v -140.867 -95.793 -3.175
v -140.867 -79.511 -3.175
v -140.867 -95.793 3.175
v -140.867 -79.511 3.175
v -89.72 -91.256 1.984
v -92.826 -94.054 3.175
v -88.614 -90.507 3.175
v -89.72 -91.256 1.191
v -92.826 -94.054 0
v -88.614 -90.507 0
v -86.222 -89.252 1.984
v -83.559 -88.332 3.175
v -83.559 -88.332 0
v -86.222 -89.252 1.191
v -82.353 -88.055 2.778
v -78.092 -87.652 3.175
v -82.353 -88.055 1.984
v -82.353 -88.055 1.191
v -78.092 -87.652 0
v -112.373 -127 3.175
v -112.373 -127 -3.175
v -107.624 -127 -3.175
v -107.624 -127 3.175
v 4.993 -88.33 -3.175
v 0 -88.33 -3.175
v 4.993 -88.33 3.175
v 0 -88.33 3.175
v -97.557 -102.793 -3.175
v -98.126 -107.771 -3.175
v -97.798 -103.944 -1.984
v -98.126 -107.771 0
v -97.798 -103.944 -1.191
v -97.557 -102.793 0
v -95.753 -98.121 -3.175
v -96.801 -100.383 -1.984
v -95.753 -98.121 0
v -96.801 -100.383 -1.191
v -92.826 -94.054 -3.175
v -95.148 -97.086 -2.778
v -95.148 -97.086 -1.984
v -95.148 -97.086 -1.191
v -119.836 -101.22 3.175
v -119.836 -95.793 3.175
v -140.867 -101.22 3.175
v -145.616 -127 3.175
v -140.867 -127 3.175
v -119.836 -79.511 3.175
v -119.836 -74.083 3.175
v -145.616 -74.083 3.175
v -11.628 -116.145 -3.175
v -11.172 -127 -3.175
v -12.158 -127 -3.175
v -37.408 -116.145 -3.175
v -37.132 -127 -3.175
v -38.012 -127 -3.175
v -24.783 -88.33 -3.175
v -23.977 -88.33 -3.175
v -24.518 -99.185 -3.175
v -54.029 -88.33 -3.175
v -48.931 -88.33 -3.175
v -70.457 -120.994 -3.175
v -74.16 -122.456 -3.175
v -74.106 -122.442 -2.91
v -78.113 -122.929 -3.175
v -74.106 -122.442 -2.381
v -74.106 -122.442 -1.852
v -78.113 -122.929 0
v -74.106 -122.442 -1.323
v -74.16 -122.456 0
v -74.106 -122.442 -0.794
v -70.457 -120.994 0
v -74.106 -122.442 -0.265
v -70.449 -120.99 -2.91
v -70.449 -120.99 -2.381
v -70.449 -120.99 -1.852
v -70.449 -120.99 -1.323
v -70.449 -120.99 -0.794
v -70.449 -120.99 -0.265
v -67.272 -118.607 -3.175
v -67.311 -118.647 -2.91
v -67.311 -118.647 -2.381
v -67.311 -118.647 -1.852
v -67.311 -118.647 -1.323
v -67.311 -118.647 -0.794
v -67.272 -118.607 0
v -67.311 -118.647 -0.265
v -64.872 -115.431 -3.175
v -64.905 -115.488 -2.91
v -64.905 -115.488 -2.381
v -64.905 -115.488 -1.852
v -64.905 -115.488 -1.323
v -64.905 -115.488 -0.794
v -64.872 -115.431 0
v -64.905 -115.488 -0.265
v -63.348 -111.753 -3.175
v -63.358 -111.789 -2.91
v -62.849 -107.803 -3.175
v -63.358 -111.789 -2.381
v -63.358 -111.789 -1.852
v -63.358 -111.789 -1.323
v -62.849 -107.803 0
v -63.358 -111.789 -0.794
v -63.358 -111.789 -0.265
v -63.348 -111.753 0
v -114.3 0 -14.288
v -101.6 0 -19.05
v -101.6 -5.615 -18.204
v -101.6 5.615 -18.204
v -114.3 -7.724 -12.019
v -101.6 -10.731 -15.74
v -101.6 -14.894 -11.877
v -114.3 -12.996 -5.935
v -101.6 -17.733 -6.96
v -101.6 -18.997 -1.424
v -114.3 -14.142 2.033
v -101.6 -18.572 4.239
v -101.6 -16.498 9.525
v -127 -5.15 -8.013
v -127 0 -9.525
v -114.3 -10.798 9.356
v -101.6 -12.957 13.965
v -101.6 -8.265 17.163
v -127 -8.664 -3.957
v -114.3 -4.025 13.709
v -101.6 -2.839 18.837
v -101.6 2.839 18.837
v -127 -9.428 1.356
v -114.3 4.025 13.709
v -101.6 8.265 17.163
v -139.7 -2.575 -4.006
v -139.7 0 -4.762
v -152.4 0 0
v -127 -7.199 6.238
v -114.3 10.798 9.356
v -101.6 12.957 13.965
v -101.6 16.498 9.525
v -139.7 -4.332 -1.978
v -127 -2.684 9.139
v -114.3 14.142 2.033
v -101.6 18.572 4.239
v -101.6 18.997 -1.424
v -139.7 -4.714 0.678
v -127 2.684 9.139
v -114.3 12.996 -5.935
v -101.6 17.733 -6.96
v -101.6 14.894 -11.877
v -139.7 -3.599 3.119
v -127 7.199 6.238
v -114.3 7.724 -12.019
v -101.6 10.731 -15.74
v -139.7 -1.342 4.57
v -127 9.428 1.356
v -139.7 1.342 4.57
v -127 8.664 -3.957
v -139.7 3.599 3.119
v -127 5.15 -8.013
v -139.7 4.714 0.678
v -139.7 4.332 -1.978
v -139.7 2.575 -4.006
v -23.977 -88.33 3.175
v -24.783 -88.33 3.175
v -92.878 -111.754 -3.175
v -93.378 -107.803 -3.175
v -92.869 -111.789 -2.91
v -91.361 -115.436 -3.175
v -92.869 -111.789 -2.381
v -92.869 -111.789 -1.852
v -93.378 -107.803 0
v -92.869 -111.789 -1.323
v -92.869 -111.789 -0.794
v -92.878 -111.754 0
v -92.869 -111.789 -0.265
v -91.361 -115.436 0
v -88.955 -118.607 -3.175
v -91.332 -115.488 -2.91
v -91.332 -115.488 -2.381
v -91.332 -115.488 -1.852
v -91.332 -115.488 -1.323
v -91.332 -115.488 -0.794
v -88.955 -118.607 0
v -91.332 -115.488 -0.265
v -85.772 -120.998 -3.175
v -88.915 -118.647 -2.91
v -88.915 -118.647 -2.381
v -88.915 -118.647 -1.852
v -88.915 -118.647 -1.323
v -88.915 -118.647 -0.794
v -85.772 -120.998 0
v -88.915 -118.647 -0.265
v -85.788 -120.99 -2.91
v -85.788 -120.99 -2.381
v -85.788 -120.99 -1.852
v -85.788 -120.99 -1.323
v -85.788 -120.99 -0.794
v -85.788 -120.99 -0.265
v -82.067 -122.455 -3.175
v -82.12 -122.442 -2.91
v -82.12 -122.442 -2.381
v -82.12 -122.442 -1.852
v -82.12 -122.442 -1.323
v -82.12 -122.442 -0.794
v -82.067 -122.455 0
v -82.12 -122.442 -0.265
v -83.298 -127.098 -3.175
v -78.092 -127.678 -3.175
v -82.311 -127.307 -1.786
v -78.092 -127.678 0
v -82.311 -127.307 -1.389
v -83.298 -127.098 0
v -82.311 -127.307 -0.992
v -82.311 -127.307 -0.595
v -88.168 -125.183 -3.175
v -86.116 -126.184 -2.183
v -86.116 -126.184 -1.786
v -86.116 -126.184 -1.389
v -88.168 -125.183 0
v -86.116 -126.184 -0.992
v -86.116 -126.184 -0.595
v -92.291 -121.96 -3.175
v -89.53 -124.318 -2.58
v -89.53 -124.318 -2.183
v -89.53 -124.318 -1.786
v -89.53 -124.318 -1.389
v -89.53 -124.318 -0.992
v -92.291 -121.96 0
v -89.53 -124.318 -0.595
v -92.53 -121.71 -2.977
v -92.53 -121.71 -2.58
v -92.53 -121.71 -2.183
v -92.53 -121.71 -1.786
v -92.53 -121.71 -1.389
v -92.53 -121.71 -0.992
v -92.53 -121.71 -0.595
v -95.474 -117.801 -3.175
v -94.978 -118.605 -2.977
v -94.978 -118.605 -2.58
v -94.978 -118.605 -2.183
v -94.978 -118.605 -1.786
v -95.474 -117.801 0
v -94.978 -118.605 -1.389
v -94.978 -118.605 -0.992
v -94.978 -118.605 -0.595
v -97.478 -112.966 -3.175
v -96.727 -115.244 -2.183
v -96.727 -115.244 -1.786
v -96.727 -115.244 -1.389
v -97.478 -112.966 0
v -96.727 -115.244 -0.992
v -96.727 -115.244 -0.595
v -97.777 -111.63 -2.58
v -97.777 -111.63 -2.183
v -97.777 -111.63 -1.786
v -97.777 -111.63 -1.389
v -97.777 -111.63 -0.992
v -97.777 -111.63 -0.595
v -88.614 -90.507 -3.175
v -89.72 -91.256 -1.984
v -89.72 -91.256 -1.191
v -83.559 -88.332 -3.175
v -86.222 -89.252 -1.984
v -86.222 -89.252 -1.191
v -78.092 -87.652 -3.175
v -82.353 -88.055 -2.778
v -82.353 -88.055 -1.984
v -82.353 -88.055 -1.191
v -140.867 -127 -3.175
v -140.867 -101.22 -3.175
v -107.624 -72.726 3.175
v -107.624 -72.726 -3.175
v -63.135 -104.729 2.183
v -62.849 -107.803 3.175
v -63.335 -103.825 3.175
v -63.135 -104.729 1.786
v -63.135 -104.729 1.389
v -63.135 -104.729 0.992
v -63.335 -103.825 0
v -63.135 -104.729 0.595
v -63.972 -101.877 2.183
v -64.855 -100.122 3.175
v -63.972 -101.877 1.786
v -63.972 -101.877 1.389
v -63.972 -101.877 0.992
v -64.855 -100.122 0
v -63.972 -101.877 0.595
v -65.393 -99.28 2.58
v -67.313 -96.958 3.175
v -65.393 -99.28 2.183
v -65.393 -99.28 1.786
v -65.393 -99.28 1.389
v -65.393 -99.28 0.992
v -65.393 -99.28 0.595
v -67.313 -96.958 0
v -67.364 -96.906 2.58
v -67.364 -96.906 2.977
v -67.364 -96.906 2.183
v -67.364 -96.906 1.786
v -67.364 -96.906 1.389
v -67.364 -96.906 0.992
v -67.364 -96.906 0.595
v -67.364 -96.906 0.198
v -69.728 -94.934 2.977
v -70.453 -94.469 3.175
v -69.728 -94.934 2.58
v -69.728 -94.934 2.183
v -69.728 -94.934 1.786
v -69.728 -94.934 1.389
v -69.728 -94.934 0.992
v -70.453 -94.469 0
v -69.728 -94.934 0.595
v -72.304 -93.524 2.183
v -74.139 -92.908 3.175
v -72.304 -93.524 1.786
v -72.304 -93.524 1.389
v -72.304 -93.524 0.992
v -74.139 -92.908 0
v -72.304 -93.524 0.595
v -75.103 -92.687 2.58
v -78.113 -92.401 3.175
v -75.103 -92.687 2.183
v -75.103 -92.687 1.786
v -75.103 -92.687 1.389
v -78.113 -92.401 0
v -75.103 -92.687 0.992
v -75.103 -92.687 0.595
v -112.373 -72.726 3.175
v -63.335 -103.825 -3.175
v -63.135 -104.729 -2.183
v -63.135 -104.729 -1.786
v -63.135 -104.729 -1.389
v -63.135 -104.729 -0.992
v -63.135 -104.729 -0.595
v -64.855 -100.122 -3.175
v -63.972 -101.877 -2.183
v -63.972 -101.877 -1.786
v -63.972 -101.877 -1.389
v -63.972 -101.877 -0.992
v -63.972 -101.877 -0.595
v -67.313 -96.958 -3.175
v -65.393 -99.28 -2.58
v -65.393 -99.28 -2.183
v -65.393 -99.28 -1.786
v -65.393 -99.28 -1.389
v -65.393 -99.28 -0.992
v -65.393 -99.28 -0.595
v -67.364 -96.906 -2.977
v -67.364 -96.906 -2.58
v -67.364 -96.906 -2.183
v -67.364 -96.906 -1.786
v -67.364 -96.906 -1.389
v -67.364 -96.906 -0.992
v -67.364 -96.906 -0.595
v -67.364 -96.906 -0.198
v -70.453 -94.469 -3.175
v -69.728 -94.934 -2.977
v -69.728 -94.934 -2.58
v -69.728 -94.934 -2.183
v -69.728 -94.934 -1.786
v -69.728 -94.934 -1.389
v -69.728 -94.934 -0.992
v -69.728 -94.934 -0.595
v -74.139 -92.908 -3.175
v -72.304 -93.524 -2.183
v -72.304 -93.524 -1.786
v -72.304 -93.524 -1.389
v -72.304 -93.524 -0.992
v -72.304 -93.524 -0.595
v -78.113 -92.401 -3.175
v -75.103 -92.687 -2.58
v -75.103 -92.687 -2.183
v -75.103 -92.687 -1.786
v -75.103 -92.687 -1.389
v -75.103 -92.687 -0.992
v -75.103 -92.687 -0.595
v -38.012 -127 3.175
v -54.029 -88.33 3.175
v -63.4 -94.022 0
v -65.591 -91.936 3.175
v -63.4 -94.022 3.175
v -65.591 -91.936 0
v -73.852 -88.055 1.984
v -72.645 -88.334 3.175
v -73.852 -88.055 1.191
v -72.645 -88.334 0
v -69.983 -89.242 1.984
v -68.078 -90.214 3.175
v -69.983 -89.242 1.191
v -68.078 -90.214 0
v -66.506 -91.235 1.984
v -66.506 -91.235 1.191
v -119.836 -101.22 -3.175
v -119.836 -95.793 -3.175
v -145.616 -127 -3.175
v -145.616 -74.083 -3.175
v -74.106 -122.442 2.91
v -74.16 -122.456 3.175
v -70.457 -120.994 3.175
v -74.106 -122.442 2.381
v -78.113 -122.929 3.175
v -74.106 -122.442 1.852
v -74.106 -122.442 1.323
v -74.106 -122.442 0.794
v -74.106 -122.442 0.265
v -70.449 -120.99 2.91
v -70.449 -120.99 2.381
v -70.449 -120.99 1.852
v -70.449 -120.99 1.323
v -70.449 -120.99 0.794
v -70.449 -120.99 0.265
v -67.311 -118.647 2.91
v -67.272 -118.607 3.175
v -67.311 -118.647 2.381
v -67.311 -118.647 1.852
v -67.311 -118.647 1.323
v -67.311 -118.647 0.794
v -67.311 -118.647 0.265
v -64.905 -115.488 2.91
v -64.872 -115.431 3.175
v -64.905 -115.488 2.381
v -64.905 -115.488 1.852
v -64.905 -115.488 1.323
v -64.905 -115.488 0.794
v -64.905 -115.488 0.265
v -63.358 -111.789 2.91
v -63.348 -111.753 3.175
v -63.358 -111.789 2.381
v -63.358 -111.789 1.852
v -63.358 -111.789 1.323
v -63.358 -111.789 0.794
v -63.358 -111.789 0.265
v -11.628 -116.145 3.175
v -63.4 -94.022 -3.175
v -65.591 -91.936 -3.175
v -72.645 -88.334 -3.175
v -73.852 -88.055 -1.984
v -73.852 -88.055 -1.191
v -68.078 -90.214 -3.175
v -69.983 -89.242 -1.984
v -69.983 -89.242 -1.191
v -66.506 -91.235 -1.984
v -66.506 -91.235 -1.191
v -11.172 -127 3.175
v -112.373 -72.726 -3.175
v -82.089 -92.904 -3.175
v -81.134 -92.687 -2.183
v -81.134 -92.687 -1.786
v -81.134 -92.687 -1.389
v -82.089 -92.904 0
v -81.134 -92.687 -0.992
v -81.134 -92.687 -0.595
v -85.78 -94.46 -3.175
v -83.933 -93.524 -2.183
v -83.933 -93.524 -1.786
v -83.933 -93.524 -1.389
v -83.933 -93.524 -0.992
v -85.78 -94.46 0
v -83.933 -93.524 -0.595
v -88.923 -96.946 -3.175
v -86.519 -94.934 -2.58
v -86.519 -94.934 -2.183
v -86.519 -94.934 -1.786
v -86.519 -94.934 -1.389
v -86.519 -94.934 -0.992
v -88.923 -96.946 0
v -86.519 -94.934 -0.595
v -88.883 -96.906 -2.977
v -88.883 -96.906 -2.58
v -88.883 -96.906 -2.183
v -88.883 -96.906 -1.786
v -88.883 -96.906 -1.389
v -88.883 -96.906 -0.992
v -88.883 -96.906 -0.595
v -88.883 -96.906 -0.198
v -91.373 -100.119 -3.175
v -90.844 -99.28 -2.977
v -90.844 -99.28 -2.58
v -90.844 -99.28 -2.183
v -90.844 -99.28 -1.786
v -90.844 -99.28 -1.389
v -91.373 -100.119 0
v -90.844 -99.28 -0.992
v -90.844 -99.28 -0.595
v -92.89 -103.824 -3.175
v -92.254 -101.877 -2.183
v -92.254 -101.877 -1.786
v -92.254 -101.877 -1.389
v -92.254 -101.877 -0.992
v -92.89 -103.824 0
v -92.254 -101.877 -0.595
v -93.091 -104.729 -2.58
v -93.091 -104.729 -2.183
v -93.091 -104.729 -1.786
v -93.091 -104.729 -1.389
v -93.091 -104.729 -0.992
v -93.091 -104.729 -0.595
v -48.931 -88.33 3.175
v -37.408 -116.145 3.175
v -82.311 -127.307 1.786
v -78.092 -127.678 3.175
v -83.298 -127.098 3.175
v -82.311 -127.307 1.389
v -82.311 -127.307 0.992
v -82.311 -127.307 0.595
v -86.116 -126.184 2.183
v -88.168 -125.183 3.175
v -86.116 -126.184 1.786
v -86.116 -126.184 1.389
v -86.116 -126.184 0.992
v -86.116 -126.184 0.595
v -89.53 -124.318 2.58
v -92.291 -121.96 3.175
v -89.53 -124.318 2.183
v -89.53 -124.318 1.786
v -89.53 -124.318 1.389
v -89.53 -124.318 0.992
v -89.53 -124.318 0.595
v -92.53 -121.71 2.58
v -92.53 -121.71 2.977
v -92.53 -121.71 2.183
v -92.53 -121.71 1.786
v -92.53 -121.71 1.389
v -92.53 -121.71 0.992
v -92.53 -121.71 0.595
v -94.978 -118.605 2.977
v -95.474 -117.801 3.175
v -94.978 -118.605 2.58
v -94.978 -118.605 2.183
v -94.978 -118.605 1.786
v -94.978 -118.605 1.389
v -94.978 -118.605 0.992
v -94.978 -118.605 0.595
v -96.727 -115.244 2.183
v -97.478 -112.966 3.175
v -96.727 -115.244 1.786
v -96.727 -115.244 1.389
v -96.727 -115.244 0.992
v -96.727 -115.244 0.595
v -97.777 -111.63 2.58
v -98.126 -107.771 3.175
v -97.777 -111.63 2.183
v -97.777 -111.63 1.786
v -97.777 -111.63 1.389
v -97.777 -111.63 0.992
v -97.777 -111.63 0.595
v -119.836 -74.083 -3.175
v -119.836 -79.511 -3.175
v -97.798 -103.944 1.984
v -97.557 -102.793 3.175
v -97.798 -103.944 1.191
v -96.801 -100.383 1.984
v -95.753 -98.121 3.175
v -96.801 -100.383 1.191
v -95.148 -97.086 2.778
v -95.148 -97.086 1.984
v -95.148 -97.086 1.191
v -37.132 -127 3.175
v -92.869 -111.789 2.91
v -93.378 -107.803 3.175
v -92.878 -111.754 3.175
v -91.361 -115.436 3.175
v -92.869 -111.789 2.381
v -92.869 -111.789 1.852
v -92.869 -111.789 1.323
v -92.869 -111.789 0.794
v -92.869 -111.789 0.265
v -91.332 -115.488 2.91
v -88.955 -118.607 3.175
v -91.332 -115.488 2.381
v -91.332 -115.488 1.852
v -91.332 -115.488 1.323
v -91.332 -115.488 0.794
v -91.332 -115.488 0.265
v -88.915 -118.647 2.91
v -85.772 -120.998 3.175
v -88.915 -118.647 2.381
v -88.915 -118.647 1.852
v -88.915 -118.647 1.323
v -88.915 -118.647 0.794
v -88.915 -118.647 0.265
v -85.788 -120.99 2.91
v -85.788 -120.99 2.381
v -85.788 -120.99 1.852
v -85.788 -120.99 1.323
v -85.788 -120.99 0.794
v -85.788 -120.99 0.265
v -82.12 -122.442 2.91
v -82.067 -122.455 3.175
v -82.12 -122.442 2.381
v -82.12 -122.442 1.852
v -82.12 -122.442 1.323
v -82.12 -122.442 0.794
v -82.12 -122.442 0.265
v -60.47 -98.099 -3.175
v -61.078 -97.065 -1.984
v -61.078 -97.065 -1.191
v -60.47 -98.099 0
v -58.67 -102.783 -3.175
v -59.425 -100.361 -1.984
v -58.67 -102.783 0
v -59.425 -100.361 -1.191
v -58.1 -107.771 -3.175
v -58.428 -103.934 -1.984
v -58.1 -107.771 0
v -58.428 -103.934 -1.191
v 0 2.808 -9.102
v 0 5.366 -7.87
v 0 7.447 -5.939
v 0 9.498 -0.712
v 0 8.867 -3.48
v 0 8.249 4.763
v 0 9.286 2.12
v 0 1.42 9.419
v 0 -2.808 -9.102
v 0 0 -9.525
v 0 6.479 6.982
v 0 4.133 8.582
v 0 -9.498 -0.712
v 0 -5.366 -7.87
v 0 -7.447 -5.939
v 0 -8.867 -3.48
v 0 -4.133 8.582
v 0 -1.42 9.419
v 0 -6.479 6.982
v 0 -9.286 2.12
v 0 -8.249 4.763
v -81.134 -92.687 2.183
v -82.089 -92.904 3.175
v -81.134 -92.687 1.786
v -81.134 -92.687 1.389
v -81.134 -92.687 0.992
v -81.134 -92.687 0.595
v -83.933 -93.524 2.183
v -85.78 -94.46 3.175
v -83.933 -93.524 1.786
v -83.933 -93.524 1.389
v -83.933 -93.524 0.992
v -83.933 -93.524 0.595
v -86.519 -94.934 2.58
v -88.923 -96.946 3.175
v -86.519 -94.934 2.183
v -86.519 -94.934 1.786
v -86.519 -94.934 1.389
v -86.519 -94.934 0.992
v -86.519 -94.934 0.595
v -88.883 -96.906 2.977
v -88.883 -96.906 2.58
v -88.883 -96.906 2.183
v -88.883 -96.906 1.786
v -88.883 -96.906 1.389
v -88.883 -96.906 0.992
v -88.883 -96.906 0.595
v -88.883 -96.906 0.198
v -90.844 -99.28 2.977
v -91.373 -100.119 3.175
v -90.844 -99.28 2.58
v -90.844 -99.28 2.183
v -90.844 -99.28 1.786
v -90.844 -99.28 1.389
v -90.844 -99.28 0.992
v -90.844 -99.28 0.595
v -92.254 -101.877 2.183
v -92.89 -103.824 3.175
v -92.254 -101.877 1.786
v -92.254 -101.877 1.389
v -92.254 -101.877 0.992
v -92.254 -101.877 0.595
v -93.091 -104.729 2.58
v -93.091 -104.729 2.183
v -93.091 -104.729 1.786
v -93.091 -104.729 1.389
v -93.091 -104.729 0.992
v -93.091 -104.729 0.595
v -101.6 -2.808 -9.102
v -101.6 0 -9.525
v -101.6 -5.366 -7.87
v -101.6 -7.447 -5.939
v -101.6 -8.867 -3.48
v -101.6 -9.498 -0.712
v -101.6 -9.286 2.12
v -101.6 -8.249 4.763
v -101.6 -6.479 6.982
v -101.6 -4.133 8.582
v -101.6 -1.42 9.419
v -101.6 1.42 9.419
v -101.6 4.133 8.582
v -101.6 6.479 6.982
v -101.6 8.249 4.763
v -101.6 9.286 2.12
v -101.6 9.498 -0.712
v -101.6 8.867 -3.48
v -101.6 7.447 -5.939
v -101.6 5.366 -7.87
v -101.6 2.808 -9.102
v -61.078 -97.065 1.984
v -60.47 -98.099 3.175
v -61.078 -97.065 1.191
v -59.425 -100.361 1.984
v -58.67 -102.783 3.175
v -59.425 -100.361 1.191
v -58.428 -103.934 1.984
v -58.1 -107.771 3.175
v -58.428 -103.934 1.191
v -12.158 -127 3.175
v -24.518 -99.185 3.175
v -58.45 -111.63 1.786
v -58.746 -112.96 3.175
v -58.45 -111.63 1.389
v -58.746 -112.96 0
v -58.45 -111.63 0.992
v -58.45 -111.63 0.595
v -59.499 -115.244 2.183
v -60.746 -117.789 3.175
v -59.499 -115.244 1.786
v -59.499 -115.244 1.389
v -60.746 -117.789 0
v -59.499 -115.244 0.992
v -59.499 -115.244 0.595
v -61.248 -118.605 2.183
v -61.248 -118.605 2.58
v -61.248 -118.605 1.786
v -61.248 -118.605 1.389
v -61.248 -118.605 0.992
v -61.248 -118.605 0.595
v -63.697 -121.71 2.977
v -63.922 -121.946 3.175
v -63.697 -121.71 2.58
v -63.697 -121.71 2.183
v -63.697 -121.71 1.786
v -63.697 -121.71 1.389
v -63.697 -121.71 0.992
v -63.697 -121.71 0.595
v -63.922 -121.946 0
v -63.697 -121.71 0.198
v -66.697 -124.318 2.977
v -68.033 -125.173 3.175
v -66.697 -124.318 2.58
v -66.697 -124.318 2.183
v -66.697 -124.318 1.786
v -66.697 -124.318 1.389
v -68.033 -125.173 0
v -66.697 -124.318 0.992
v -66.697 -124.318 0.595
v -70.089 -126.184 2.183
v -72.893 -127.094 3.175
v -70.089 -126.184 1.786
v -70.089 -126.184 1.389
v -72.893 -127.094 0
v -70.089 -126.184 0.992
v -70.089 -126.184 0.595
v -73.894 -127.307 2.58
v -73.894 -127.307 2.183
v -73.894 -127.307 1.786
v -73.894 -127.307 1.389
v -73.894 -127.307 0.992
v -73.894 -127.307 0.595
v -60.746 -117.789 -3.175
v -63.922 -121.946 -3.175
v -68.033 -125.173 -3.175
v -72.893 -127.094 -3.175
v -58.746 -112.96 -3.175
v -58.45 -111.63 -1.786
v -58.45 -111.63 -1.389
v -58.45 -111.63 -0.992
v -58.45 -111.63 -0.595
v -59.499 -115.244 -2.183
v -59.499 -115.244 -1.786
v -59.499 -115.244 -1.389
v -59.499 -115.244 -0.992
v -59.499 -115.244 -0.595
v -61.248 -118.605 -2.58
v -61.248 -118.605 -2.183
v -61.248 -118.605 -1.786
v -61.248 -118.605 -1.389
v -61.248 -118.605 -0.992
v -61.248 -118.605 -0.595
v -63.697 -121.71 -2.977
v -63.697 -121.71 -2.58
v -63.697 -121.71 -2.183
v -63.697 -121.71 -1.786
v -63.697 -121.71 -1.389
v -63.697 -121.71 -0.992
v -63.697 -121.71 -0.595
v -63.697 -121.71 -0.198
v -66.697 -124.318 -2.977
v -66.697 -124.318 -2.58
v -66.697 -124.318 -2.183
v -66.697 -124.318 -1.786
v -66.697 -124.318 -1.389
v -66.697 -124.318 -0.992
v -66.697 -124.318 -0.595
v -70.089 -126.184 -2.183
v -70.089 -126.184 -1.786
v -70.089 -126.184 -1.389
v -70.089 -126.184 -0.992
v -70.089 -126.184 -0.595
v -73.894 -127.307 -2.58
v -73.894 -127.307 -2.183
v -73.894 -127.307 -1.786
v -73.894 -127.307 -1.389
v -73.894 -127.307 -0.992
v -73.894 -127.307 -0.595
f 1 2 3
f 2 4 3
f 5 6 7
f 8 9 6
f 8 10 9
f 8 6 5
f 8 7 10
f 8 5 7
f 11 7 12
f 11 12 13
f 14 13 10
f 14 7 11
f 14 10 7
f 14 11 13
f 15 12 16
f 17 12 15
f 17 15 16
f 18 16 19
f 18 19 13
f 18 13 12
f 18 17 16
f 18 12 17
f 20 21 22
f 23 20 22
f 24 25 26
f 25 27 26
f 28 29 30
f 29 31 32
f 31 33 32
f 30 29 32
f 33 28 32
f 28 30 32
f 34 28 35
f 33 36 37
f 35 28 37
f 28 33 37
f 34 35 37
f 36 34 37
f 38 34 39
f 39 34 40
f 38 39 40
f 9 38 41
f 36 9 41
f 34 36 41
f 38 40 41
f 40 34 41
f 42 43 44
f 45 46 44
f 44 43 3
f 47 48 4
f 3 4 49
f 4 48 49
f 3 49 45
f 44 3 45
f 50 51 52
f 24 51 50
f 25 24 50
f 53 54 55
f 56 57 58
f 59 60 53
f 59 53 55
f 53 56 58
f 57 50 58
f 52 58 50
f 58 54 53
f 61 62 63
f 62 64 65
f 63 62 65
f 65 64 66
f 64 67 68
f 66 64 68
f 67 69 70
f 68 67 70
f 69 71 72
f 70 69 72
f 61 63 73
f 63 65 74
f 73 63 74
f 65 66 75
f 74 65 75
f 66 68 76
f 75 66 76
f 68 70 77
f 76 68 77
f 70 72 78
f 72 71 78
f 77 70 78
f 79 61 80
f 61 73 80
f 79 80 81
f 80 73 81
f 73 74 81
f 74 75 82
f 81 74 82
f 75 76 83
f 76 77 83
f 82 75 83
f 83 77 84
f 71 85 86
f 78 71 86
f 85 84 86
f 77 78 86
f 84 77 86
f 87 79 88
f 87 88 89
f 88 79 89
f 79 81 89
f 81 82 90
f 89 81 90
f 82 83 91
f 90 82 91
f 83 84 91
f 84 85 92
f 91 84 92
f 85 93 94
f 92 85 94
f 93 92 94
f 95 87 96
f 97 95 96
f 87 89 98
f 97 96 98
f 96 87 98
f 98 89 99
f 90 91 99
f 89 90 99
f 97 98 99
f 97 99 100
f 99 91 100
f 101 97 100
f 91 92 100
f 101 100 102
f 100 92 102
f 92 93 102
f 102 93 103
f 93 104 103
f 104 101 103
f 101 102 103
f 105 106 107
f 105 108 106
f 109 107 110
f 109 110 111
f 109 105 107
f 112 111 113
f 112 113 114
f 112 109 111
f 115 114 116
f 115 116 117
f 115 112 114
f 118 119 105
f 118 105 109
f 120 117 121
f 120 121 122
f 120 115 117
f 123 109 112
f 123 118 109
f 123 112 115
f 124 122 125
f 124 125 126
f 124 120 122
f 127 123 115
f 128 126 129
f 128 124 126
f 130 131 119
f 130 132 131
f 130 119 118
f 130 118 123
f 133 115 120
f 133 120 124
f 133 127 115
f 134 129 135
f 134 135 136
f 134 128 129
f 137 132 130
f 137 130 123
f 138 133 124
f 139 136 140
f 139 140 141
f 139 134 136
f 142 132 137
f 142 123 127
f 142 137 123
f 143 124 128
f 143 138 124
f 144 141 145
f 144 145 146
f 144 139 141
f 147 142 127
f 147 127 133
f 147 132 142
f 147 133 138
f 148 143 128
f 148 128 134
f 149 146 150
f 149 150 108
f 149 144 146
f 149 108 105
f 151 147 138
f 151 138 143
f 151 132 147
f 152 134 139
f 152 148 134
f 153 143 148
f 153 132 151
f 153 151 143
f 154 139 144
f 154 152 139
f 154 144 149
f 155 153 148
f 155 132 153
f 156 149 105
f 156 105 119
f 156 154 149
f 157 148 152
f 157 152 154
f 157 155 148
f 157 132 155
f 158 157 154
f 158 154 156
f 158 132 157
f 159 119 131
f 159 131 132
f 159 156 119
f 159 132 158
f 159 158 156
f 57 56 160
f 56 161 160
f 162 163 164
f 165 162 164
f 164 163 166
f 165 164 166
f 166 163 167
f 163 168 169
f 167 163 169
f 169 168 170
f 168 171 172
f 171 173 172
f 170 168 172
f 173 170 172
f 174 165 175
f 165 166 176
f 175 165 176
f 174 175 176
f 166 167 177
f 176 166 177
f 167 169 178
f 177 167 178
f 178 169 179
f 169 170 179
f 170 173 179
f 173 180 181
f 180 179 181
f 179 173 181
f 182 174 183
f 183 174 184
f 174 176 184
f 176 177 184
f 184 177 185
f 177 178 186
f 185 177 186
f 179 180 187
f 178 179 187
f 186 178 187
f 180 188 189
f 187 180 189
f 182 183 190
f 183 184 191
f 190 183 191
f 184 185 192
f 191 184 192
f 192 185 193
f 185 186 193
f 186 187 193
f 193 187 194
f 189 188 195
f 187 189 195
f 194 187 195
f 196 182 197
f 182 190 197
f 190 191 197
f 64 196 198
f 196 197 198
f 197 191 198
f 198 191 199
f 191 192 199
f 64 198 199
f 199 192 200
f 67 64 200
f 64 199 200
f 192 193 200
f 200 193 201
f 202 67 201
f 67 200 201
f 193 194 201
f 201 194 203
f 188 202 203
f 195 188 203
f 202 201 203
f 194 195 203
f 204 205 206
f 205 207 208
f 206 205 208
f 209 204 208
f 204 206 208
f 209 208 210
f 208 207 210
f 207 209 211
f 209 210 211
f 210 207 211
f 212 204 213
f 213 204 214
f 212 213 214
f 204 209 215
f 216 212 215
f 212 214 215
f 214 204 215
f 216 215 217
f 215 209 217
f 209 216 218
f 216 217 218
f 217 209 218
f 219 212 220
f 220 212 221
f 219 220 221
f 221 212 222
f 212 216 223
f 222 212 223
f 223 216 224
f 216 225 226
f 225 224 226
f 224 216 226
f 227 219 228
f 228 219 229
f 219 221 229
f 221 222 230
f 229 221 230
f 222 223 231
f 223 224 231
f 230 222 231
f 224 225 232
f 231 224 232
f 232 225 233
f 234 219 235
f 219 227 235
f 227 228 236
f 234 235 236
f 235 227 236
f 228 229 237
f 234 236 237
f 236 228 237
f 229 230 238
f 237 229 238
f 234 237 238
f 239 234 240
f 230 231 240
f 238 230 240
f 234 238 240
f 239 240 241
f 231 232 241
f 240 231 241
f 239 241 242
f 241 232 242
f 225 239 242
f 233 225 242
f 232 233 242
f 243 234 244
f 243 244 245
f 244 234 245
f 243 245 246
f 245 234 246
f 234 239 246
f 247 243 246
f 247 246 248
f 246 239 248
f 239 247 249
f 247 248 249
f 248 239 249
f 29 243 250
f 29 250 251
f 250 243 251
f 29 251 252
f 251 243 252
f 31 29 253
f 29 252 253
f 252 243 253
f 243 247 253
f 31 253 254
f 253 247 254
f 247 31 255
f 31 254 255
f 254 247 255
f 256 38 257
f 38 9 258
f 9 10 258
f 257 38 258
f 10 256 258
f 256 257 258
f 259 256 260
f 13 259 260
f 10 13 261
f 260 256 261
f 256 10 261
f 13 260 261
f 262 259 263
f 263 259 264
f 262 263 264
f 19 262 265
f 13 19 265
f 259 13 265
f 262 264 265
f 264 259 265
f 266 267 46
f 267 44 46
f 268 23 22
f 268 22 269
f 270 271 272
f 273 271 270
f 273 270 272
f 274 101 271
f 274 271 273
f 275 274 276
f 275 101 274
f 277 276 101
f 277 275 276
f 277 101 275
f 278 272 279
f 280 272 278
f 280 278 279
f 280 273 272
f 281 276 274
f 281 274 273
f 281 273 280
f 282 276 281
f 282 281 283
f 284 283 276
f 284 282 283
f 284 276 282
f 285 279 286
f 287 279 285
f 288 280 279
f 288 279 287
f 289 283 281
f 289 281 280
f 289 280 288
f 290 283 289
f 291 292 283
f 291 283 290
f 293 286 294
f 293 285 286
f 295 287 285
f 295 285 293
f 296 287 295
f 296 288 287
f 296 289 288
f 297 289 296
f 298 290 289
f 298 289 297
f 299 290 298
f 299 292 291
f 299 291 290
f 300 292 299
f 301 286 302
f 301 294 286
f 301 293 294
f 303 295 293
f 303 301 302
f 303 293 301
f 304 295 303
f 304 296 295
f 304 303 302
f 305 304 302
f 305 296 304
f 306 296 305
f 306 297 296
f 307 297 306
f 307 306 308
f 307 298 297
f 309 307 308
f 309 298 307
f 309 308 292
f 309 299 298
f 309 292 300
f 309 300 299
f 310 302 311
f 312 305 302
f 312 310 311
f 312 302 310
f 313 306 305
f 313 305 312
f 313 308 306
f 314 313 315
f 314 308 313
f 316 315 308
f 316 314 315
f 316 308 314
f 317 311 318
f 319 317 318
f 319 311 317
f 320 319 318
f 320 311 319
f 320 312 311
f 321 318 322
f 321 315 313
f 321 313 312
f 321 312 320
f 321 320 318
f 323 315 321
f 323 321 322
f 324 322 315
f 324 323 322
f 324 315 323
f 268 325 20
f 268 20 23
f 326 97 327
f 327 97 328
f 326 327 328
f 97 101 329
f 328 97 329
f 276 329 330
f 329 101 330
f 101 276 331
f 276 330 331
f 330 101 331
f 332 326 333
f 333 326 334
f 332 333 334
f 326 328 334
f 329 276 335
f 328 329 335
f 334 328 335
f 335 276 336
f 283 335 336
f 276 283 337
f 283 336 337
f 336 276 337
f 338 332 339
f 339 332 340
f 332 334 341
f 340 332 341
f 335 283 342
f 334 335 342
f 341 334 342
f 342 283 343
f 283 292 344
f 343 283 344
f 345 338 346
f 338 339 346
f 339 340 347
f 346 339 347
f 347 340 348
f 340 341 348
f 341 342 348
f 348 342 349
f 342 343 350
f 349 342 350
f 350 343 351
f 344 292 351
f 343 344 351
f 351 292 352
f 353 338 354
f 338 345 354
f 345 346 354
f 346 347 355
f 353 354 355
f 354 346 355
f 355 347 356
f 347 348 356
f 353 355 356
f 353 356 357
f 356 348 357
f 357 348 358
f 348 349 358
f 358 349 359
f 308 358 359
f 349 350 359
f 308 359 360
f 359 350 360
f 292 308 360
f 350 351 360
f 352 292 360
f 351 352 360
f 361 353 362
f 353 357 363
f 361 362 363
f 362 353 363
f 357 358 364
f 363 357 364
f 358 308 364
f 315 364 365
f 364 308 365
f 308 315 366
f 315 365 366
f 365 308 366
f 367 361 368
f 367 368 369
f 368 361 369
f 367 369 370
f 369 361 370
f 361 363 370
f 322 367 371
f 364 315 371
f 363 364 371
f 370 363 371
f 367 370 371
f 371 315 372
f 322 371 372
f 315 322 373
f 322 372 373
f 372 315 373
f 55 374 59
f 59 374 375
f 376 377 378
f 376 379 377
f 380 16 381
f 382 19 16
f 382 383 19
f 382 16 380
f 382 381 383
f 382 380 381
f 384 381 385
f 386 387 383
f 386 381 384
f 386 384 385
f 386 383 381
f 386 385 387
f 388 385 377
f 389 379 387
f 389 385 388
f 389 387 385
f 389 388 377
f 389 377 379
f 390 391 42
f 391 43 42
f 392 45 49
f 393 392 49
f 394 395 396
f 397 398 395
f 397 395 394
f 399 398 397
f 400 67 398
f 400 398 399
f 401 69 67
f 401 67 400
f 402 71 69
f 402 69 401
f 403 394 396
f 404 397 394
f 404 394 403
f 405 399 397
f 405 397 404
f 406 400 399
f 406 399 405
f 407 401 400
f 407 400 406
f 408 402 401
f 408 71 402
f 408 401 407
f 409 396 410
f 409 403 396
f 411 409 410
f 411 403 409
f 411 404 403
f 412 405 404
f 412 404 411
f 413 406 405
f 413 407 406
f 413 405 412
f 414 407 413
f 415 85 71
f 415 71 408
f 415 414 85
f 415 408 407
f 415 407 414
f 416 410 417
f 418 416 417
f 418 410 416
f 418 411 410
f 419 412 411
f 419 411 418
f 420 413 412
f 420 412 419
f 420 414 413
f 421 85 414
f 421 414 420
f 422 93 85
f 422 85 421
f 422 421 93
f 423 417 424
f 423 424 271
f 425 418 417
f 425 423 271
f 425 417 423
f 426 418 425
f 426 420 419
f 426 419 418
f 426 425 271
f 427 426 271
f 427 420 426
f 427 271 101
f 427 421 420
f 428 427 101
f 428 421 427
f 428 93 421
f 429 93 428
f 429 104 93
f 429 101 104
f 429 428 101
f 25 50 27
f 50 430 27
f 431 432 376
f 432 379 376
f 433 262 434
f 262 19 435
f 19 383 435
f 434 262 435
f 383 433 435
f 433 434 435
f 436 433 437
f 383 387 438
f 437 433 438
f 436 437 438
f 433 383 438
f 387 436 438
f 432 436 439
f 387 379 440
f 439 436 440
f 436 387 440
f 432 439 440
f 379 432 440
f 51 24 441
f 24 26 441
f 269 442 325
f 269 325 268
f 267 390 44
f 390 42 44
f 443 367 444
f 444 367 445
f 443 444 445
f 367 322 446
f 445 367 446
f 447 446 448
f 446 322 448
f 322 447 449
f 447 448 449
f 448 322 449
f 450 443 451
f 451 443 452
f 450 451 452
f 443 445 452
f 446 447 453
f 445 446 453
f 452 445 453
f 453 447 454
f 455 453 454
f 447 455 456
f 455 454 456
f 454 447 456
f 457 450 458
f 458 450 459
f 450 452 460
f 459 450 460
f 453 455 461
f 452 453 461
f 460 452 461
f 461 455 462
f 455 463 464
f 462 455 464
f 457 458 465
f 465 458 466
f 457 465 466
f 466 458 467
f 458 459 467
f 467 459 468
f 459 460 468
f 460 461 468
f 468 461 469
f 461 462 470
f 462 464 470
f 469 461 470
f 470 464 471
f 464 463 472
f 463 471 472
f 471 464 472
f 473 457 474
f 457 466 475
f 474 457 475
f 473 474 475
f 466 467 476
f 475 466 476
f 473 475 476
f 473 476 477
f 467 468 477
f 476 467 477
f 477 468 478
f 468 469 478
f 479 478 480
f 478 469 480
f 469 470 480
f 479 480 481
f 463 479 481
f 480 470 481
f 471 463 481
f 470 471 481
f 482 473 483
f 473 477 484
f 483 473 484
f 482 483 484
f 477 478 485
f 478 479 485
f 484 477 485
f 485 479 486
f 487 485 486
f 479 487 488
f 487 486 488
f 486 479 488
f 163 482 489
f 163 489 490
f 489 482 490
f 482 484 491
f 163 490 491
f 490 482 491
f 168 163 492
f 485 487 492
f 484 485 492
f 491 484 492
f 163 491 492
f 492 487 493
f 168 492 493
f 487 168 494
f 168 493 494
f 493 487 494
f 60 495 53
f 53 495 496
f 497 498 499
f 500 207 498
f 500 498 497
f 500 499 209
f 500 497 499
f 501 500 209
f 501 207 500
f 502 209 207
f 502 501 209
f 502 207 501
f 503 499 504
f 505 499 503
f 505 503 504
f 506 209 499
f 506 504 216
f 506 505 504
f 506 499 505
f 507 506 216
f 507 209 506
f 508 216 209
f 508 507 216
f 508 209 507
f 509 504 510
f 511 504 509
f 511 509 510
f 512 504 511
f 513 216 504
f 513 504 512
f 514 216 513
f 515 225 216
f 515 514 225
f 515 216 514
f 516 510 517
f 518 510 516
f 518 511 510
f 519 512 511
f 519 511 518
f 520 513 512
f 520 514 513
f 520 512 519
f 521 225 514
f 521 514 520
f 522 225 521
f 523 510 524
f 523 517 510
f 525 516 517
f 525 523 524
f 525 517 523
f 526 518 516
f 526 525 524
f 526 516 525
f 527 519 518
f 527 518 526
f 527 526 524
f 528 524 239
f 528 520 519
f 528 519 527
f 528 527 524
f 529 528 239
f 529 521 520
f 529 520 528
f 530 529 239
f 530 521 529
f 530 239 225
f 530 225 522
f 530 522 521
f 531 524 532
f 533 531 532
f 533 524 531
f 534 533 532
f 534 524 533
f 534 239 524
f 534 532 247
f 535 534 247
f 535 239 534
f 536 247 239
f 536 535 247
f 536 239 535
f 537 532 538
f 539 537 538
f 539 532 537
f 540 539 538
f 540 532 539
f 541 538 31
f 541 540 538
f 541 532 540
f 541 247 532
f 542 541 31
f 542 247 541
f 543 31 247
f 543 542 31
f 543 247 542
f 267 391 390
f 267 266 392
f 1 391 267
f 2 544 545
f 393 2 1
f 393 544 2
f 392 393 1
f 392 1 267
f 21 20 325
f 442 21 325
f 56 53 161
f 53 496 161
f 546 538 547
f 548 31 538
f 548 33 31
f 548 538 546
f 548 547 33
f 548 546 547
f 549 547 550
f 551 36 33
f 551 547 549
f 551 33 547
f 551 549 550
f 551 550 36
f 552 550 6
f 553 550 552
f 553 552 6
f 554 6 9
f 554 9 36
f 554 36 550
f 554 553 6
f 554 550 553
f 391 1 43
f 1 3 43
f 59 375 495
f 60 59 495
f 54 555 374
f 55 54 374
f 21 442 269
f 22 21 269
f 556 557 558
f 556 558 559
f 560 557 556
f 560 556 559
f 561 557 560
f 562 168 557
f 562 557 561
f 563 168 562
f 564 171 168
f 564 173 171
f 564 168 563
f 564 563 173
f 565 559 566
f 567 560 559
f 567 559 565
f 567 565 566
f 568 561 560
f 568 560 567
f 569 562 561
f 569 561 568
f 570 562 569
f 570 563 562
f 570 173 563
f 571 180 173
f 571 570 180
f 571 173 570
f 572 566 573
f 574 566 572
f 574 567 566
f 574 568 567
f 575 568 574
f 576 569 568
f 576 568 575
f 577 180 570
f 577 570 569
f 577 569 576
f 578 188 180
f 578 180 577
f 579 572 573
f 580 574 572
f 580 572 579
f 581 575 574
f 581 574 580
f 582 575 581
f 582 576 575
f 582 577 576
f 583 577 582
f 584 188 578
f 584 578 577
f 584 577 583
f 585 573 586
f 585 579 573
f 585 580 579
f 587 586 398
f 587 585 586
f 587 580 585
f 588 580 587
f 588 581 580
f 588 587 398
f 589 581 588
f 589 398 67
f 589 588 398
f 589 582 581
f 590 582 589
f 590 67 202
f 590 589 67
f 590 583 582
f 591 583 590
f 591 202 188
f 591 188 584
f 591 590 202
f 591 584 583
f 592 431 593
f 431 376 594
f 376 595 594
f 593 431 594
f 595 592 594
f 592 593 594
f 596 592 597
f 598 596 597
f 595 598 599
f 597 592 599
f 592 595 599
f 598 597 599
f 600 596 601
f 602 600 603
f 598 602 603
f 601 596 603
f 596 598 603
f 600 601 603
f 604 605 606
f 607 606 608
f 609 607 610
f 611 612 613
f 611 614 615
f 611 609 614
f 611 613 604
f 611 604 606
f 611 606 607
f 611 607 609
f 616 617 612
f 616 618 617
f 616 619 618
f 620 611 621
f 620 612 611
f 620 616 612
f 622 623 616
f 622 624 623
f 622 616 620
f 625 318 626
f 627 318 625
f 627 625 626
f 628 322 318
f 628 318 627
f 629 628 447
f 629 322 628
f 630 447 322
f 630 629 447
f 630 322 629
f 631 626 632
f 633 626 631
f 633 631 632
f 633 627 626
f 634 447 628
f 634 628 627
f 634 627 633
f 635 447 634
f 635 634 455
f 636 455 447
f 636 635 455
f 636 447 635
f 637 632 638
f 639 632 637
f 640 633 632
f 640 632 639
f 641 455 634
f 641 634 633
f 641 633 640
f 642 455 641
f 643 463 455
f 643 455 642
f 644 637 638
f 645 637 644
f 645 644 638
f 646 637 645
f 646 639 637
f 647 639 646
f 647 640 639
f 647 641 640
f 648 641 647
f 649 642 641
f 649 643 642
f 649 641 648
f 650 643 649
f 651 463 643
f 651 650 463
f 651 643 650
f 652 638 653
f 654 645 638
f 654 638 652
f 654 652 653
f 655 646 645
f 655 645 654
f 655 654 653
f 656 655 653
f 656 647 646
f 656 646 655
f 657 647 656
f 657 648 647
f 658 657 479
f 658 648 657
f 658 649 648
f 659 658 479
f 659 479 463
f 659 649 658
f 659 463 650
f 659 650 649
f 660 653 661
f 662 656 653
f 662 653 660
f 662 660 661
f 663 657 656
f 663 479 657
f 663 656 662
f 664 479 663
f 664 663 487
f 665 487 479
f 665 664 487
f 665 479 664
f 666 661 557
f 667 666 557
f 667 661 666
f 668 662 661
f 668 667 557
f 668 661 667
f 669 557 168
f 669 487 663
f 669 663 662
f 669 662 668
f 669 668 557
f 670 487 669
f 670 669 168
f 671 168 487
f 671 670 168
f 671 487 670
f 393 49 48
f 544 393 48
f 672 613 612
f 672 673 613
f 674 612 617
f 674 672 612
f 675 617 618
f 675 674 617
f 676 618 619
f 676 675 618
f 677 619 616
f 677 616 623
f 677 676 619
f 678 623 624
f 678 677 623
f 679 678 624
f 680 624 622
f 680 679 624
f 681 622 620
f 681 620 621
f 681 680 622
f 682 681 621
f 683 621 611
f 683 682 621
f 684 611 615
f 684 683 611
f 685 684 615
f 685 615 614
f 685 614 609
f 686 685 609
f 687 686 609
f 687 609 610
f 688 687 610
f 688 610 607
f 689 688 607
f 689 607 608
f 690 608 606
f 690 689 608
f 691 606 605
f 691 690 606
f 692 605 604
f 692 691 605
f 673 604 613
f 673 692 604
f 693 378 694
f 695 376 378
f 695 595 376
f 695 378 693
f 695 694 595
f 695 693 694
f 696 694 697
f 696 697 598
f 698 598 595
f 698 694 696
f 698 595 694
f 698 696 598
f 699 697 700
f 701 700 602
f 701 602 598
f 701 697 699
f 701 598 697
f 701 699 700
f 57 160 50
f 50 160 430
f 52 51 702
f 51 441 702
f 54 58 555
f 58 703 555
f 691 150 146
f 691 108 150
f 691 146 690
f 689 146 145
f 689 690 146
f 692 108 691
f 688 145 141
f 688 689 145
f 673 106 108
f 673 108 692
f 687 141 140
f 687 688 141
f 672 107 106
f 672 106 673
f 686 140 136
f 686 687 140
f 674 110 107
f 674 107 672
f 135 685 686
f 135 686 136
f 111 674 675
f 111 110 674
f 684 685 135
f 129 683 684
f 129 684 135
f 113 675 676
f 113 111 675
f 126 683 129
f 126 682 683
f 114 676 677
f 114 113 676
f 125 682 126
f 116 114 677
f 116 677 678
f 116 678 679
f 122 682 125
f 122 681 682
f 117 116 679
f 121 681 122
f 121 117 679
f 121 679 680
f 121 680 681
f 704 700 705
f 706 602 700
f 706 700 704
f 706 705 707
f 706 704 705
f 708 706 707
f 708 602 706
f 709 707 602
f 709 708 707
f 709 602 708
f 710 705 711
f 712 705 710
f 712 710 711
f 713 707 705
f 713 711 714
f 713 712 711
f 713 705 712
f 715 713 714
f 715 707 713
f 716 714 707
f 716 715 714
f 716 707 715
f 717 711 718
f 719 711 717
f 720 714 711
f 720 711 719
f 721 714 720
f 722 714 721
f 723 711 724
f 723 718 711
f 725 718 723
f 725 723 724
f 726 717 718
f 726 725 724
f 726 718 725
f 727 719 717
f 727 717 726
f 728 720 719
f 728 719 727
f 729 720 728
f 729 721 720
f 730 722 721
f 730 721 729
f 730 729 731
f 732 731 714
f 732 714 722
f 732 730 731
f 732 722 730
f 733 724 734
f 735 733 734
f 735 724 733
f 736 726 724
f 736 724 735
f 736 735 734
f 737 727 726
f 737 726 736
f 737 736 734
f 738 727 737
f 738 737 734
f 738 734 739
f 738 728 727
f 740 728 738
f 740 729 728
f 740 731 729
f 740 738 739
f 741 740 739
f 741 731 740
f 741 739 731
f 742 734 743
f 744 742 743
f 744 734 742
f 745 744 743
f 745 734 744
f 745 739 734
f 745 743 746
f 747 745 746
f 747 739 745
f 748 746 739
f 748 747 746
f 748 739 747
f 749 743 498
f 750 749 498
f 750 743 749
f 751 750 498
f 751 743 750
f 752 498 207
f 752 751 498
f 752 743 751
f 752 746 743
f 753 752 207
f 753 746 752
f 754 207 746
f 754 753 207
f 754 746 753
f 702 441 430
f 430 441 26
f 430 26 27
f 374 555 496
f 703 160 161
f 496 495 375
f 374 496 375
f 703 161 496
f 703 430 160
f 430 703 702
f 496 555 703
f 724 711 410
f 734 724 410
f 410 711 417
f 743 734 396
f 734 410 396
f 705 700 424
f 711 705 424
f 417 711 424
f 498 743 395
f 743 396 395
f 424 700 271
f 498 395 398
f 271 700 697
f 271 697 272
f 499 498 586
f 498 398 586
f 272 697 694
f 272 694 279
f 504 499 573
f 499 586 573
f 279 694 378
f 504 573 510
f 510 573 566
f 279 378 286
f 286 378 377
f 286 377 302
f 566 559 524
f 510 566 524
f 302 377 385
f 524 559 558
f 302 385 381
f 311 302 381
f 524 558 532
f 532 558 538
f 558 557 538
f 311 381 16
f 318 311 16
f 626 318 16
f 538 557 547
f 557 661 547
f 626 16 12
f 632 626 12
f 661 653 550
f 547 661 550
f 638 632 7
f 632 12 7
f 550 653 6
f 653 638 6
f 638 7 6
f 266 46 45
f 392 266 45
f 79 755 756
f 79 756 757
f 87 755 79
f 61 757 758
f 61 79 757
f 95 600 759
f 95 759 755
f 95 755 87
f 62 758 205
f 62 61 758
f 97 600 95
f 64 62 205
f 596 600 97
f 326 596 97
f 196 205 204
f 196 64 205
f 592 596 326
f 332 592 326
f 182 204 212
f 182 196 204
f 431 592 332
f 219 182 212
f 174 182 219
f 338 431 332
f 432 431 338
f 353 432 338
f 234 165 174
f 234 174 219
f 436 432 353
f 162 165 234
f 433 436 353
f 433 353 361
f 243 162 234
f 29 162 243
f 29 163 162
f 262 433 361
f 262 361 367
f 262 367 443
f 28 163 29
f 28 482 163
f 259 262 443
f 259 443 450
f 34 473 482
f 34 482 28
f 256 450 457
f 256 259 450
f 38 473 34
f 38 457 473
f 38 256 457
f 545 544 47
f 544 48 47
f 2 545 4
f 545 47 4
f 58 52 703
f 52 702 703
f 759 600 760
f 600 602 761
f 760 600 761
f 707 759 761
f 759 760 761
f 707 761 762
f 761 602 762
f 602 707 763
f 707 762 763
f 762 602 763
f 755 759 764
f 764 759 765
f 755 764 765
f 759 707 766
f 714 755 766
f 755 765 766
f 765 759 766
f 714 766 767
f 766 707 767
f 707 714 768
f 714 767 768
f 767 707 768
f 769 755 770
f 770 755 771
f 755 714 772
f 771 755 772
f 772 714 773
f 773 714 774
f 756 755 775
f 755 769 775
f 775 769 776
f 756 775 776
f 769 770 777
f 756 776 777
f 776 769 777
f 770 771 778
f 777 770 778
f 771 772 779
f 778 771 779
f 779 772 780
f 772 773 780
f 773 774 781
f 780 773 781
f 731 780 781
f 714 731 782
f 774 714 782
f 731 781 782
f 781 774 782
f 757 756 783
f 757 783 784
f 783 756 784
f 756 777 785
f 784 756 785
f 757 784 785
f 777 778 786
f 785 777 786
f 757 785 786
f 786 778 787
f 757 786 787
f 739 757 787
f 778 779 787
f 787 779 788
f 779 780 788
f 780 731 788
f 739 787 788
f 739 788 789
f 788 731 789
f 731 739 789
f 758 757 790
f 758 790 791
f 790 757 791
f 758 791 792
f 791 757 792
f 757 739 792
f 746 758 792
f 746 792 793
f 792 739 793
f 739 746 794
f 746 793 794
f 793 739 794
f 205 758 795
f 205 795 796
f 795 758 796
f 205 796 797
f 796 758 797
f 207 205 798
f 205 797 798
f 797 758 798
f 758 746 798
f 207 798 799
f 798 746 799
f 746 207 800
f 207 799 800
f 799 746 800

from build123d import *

# Parameters (mm, degrees)
BOSS_EXTRUDE1_DEPTH   = 3.175
SKETCH2_W             = 4.748931624
SKETCH2_H             = 54.273504274
BOSS_EXTRUDE1_2_DEPTH = 3.175
BOSS_EXTRUDE1_3_DEPTH = 3.175
BOSS_EXTRUDE1_4_DEPTH = 3.175


with BuildPart() as part:
    # Sketch1 → Revolve1 (revolve)
    with BuildSketch(Plane(origin=(0, 0, 0), x_dir=(1, 0, 0), z_dir=(0, 1, 0))):
        Polygon((0, 0), (0, 9.525), (-101.6, 9.525), (-101.6, 19.05), (-152.4, 0), align=None)
    revolve(axis=Axis((0, 0, 0), (-1, 0, 0)))


with BuildPart() as body_2:
    # Sketch2 → Boss-Extrude1 (new, symmetric)
    with BuildSketch(Plane.XY):
        Polygon((-145.615811966, -74.083333333), (-119.835897436, -74.083333333), (-119.835897436, -79.510683761), (-140.866880342, -79.510683761), (-140.866880342, -95.792735043), (-119.835897436, -95.792735043), (-119.835897436, -101.22008547), (-140.866880342, -101.22008547), (-140.866880342, -127), (-145.615811966, -127), align=None)
    extrude(amount=BOSS_EXTRUDE1_DEPTH, both=True)


with BuildPart() as body_3:
    # Sketch2 → Boss-Extrude1 2 (new, symmetric)
    with BuildSketch(Plane.XY):
        with Locations((-109.998824786, -99.863247863)):
            Rectangle(SKETCH2_W, SKETCH2_H)
    extrude(amount=BOSS_EXTRUDE1_2_DEPTH, both=True)


with BuildPart() as body_4:
    # Sketch2 → Boss-Extrude1 3 (new, symmetric)
    with BuildSketch(Plane.XY):
        with BuildLine():
            add(Edge.make_bspline(
                [(-78.091940438, -87.651709402), (-77.366358099, -87.667159422), (-75.943668454, -87.697453137), (-73.860144466, -88.021227023), (-71.871307291, -88.516335984), (-69.969539862, -89.200798887), (-68.179198252, -90.118252187), (-66.474204443, -91.213011708), (-64.859232999, -92.509962825), (-63.891265771, -93.51323362), (-63.399933226, -94.022485978)],
                knots=[0, 0, 0, 0, 1.054011418, 2.066658804, 3.057071809, 4.030435133, 4.997543892, 5.974964718, 6.972108034, 8, 8, 8, 8], degree=3))
            add(Edge.make_bspline(
                [(-63.399933226, -94.022485978), (-62.976872731, -94.509530763), (-62.138939125, -95.474194675), (-61.064493138, -97.038345014), (-60.138881455, -98.658201296), (-59.397096211, -100.355273973), (-58.812215496, -102.114748168), (-58.396960326, -103.942671432), (-58.149961429, -105.835006919), (-58.116654667, -107.120183995), (-58.099786325, -107.771067041)],
                knots=[0, 0, 0, 0, 1.025258237, 2.030674902, 3.01204498, 3.988269485, 4.97094183, 5.956517959, 6.965070386, 8, 8, 8, 8], degree=3))
            add(Edge.make_bspline(
                [(-58.099786325, -107.771067041), (-58.11462321, -108.425722675), (-58.143941588, -109.719352738), (-58.421279598, -111.62464553), (-58.852642444, -113.472114873), (-59.46998095, -115.254026076), (-60.261585697, -116.975825967), (-61.227552044, -118.629994153), (-62.374658637, -120.219794263), (-63.674957159, -121.731726817), (-65.112051001, -123.125192208), (-66.671068958, -124.33967914), (-68.321373992, -125.380195044), (-70.084910405, -126.218340852), (-71.945573598, -126.879189892), (-73.90737689, -127.343344903), (-75.967272596, -127.623979883), (-77.373755586, -127.660017241), (-78.091940438, -127.678418803)],
                knots=[0, 0, 0, 0, 0.998656419, 1.973391657, 2.932242238, 3.890759089, 4.846373663, 5.82037756, 6.809684879, 7.83454468, 8.860553229, 9.859544525, 10.845671541, 11.83227036, 12.833544569, 13.85385346, 14.904124723, 16, 16, 16, 16], degree=3))
            add(Edge.make_bspline(
                [(-78.091940438, -127.678418803), (-78.813643935, -127.65995548), (-80.227136695, -127.623794127), (-82.294303327, -127.34443521), (-84.259622566, -126.879403807), (-86.122721615, -126.216169095), (-87.893840134, -125.380168255), (-89.553707409, -124.342824853), (-91.113991846, -123.12483203), (-92.551389706, -121.73182441), (-93.851606715, -120.219769118), (-94.998734341, -118.630000679), (-95.964695225, -116.975824266), (-96.756301403, -115.25402653), (-97.373639526, -113.472114752), (-97.805002475, -111.624645563), (-98.082340457, -109.719352729), (-98.111658839, -108.425722672), (-98.126495726, -107.771067041)],
                knots=[0, 0, 0, 0, 1.099876186, 2.154163076, 3.173186993, 4.173200201, 5.163417411, 6.152872554, 7.150605724, 8.17532212, 9.198891216, 10.186952605, 11.159729845, 12.11414092, 13.071450619, 14.029093627, 15.002601286, 16, 16, 16, 16], degree=3))
            add(Edge.make_bspline(
                [(-98.126495726, -107.771067041), (-98.109512344, -107.123721644), (-98.075888165, -105.842089013), (-97.829137611, -103.953310834), (-97.415502293, -102.128481261), (-96.829920465, -100.375798469), (-96.081297936, -98.68616271), (-95.16869275, -97.062303956), (-94.083286758, -95.505226496), (-93.248685824, -94.541809334), (-92.826348825, -94.054286859)],
                knots=[0, 0, 0, 0, 1.031353054, 2.041901799, 3.029428768, 4.008703097, 4.981709435, 5.96992636, 6.972712378, 8, 8, 8, 8], degree=3))
            add(Edge.make_bspline(
                [(-92.826348825, -94.054286859), (-92.335757032, -93.540618135), (-91.370921947, -92.530398204), (-89.747911421, -91.237227899), (-88.047111983, -90.119687259), (-86.236985123, -89.220463525), (-84.336780009, -88.512309745), (-82.337750985, -88.019950171), (-80.247156882, -87.698619685), (-78.817505468, -87.667501997), (-78.091940438, -87.651709402)],
                knots=[0, 0, 0, 0, 1.027980169, 2.021703884, 2.998553061, 3.971491411, 4.943284454, 5.930300938, 6.949603206, 8, 8, 8, 8], degree=3))
        make_face()
        with BuildLine():
            add(Edge.make_bspline(
                [(-78.113141026, -92.400641026), (-78.626245387, -92.415224733), (-79.639208404, -92.444015672), (-81.130242601, -92.662998517), (-82.56564731, -93.009942924), (-83.948145786, -93.502885203), (-85.273075893, -94.13938046), (-86.541706144, -94.92116162), (-87.757768033, -95.837874177), (-88.897473038, -96.888083617), (-89.94344371, -98.035301748), (-90.857813119, -99.257651936), (-91.635311751, -100.53530741), (-92.283014154, -101.869596792), (-92.76542045, -103.274041622), (-93.11577448, -104.732736879), (-93.334550735, -106.248654486), (-93.363070983, -107.279184167), (-93.377564103, -107.802867922)],
                knots=[0, 0, 0, 0, 1.021534396, 2.016698045, 2.994645724, 3.958388632, 4.93408049, 5.916473867, 6.921342795, 7.962252576, 8.998418191, 10.008913653, 10.997312074, 11.973003931, 12.956656626, 13.948281152, 14.957379055, 16, 16, 16, 16], degree=3))
            add(Edge.make_bspline(
                [(-93.377564103, -107.802867922), (-93.35327046, -108.479475952), (-93.305052121, -109.822416368), (-92.912936046, -111.800155961), (-92.256976815, -113.698833963), (-91.371192943, -115.5073198), (-90.261360827, -117.180579241), (-88.953758748, -118.672398112), (-87.462420421, -119.960326452), (-85.805123334, -121.028953521), (-84.015718766, -121.878035542), (-82.121962482, -122.479758151), (-80.146799608, -122.8709135), (-78.796959982, -122.909791744), (-78.113141026, -122.929487179)],
                knots=[0, 0, 0, 0, 1.016792936, 2.018143844, 3.017858371, 4.030088057, 5.03801393, 6.028138512, 7.003788237, 7.991172063, 8.984598303, 9.972568034, 10.972917682, 12, 12, 12, 12], degree=3))
            add(Edge.make_bspline(
                [(-78.113141026, -122.929487179), (-77.4293614, -122.90967699), (-76.079599413, -122.870572225), (-74.107180906, -122.481728165), (-72.218600617, -121.875399009), (-70.43105464, -121.029908455), (-68.774511945, -119.956268375), (-67.272447849, -118.679670769), (-65.976010514, -117.176628017), (-64.867276249, -115.505103474), (-63.96698621, -113.701637674), (-63.314097326, -111.799805533), (-62.921038587, -109.822505614), (-62.872947486, -108.479505852), (-62.848717949, -107.802867922)],
                knots=[0, 0, 0, 0, 1.02726834, 2.027799167, 3.010890988, 4.004497153, 4.992059811, 5.971914811, 6.958719428, 7.966827853, 8.981595046, 9.981490638, 10.983022906, 12, 12, 12, 12], degree=3))
            add(Edge.make_bspline(
                [(-62.848717949, -107.802867922), (-62.863206079, -107.279181038), (-62.891716507, -106.248645197), (-63.110564183, -104.732772387), (-63.46065389, -103.273911343), (-63.944034293, -101.870077484), (-64.58892236, -100.531852716), (-65.381414351, -99.261403271), (-66.292050092, -98.031067396), (-67.350642277, -96.891792113), (-68.489157633, -95.837464774), (-69.705712377, -94.920806149), (-70.972461458, -94.142816312), (-72.29354241, -93.497441008), (-73.676218135, -93.014427648), (-75.109611636, -92.660995244), (-76.594284119, -92.44494108), (-77.603617272, -92.415502156), (-78.113141026, -92.400641026)],
                knots=[0, 0, 0, 0, 1.042956736, 2.052379634, 3.044323526, 4.02829302, 5.004299113, 5.996692471, 7.007513377, 8.048758398, 9.090003419, 10.095195979, 11.07790575, 12.047570684, 13.018257071, 13.989683339, 14.985167495, 16, 16, 16, 16], degree=3))
        make_face(mode=Mode.SUBTRACT)
    extrude(amount=BOSS_EXTRUDE1_3_DEPTH, both=True)


with BuildPart() as body_5:
    # Sketch2 → Boss-Extrude1 4 (new, symmetric)
    with BuildSketch(Plane.XY):
        Polygon((-54.029273504, -88.330128205), (-48.930532185, -88.330128205), (-37.408012821, -116.145299145), (-24.783062901, -88.330128205), (-23.977440572, -88.330128205), (-11.628098291, -116.145299145), (0.000424012, -88.330128205), (4.993162393, -88.330128205), (-11.172285657, -127), (-12.158112981, -127), (-24.518055556, -99.18482906), (-37.132405182, -127), (-38.012229567, -127), align=None)
    extrude(amount=BOSS_EXTRUDE1_4_DEPTH, both=True)


solid = Compound([part.part, body_2.part, body_3.part, body_4.part, body_5.part])
